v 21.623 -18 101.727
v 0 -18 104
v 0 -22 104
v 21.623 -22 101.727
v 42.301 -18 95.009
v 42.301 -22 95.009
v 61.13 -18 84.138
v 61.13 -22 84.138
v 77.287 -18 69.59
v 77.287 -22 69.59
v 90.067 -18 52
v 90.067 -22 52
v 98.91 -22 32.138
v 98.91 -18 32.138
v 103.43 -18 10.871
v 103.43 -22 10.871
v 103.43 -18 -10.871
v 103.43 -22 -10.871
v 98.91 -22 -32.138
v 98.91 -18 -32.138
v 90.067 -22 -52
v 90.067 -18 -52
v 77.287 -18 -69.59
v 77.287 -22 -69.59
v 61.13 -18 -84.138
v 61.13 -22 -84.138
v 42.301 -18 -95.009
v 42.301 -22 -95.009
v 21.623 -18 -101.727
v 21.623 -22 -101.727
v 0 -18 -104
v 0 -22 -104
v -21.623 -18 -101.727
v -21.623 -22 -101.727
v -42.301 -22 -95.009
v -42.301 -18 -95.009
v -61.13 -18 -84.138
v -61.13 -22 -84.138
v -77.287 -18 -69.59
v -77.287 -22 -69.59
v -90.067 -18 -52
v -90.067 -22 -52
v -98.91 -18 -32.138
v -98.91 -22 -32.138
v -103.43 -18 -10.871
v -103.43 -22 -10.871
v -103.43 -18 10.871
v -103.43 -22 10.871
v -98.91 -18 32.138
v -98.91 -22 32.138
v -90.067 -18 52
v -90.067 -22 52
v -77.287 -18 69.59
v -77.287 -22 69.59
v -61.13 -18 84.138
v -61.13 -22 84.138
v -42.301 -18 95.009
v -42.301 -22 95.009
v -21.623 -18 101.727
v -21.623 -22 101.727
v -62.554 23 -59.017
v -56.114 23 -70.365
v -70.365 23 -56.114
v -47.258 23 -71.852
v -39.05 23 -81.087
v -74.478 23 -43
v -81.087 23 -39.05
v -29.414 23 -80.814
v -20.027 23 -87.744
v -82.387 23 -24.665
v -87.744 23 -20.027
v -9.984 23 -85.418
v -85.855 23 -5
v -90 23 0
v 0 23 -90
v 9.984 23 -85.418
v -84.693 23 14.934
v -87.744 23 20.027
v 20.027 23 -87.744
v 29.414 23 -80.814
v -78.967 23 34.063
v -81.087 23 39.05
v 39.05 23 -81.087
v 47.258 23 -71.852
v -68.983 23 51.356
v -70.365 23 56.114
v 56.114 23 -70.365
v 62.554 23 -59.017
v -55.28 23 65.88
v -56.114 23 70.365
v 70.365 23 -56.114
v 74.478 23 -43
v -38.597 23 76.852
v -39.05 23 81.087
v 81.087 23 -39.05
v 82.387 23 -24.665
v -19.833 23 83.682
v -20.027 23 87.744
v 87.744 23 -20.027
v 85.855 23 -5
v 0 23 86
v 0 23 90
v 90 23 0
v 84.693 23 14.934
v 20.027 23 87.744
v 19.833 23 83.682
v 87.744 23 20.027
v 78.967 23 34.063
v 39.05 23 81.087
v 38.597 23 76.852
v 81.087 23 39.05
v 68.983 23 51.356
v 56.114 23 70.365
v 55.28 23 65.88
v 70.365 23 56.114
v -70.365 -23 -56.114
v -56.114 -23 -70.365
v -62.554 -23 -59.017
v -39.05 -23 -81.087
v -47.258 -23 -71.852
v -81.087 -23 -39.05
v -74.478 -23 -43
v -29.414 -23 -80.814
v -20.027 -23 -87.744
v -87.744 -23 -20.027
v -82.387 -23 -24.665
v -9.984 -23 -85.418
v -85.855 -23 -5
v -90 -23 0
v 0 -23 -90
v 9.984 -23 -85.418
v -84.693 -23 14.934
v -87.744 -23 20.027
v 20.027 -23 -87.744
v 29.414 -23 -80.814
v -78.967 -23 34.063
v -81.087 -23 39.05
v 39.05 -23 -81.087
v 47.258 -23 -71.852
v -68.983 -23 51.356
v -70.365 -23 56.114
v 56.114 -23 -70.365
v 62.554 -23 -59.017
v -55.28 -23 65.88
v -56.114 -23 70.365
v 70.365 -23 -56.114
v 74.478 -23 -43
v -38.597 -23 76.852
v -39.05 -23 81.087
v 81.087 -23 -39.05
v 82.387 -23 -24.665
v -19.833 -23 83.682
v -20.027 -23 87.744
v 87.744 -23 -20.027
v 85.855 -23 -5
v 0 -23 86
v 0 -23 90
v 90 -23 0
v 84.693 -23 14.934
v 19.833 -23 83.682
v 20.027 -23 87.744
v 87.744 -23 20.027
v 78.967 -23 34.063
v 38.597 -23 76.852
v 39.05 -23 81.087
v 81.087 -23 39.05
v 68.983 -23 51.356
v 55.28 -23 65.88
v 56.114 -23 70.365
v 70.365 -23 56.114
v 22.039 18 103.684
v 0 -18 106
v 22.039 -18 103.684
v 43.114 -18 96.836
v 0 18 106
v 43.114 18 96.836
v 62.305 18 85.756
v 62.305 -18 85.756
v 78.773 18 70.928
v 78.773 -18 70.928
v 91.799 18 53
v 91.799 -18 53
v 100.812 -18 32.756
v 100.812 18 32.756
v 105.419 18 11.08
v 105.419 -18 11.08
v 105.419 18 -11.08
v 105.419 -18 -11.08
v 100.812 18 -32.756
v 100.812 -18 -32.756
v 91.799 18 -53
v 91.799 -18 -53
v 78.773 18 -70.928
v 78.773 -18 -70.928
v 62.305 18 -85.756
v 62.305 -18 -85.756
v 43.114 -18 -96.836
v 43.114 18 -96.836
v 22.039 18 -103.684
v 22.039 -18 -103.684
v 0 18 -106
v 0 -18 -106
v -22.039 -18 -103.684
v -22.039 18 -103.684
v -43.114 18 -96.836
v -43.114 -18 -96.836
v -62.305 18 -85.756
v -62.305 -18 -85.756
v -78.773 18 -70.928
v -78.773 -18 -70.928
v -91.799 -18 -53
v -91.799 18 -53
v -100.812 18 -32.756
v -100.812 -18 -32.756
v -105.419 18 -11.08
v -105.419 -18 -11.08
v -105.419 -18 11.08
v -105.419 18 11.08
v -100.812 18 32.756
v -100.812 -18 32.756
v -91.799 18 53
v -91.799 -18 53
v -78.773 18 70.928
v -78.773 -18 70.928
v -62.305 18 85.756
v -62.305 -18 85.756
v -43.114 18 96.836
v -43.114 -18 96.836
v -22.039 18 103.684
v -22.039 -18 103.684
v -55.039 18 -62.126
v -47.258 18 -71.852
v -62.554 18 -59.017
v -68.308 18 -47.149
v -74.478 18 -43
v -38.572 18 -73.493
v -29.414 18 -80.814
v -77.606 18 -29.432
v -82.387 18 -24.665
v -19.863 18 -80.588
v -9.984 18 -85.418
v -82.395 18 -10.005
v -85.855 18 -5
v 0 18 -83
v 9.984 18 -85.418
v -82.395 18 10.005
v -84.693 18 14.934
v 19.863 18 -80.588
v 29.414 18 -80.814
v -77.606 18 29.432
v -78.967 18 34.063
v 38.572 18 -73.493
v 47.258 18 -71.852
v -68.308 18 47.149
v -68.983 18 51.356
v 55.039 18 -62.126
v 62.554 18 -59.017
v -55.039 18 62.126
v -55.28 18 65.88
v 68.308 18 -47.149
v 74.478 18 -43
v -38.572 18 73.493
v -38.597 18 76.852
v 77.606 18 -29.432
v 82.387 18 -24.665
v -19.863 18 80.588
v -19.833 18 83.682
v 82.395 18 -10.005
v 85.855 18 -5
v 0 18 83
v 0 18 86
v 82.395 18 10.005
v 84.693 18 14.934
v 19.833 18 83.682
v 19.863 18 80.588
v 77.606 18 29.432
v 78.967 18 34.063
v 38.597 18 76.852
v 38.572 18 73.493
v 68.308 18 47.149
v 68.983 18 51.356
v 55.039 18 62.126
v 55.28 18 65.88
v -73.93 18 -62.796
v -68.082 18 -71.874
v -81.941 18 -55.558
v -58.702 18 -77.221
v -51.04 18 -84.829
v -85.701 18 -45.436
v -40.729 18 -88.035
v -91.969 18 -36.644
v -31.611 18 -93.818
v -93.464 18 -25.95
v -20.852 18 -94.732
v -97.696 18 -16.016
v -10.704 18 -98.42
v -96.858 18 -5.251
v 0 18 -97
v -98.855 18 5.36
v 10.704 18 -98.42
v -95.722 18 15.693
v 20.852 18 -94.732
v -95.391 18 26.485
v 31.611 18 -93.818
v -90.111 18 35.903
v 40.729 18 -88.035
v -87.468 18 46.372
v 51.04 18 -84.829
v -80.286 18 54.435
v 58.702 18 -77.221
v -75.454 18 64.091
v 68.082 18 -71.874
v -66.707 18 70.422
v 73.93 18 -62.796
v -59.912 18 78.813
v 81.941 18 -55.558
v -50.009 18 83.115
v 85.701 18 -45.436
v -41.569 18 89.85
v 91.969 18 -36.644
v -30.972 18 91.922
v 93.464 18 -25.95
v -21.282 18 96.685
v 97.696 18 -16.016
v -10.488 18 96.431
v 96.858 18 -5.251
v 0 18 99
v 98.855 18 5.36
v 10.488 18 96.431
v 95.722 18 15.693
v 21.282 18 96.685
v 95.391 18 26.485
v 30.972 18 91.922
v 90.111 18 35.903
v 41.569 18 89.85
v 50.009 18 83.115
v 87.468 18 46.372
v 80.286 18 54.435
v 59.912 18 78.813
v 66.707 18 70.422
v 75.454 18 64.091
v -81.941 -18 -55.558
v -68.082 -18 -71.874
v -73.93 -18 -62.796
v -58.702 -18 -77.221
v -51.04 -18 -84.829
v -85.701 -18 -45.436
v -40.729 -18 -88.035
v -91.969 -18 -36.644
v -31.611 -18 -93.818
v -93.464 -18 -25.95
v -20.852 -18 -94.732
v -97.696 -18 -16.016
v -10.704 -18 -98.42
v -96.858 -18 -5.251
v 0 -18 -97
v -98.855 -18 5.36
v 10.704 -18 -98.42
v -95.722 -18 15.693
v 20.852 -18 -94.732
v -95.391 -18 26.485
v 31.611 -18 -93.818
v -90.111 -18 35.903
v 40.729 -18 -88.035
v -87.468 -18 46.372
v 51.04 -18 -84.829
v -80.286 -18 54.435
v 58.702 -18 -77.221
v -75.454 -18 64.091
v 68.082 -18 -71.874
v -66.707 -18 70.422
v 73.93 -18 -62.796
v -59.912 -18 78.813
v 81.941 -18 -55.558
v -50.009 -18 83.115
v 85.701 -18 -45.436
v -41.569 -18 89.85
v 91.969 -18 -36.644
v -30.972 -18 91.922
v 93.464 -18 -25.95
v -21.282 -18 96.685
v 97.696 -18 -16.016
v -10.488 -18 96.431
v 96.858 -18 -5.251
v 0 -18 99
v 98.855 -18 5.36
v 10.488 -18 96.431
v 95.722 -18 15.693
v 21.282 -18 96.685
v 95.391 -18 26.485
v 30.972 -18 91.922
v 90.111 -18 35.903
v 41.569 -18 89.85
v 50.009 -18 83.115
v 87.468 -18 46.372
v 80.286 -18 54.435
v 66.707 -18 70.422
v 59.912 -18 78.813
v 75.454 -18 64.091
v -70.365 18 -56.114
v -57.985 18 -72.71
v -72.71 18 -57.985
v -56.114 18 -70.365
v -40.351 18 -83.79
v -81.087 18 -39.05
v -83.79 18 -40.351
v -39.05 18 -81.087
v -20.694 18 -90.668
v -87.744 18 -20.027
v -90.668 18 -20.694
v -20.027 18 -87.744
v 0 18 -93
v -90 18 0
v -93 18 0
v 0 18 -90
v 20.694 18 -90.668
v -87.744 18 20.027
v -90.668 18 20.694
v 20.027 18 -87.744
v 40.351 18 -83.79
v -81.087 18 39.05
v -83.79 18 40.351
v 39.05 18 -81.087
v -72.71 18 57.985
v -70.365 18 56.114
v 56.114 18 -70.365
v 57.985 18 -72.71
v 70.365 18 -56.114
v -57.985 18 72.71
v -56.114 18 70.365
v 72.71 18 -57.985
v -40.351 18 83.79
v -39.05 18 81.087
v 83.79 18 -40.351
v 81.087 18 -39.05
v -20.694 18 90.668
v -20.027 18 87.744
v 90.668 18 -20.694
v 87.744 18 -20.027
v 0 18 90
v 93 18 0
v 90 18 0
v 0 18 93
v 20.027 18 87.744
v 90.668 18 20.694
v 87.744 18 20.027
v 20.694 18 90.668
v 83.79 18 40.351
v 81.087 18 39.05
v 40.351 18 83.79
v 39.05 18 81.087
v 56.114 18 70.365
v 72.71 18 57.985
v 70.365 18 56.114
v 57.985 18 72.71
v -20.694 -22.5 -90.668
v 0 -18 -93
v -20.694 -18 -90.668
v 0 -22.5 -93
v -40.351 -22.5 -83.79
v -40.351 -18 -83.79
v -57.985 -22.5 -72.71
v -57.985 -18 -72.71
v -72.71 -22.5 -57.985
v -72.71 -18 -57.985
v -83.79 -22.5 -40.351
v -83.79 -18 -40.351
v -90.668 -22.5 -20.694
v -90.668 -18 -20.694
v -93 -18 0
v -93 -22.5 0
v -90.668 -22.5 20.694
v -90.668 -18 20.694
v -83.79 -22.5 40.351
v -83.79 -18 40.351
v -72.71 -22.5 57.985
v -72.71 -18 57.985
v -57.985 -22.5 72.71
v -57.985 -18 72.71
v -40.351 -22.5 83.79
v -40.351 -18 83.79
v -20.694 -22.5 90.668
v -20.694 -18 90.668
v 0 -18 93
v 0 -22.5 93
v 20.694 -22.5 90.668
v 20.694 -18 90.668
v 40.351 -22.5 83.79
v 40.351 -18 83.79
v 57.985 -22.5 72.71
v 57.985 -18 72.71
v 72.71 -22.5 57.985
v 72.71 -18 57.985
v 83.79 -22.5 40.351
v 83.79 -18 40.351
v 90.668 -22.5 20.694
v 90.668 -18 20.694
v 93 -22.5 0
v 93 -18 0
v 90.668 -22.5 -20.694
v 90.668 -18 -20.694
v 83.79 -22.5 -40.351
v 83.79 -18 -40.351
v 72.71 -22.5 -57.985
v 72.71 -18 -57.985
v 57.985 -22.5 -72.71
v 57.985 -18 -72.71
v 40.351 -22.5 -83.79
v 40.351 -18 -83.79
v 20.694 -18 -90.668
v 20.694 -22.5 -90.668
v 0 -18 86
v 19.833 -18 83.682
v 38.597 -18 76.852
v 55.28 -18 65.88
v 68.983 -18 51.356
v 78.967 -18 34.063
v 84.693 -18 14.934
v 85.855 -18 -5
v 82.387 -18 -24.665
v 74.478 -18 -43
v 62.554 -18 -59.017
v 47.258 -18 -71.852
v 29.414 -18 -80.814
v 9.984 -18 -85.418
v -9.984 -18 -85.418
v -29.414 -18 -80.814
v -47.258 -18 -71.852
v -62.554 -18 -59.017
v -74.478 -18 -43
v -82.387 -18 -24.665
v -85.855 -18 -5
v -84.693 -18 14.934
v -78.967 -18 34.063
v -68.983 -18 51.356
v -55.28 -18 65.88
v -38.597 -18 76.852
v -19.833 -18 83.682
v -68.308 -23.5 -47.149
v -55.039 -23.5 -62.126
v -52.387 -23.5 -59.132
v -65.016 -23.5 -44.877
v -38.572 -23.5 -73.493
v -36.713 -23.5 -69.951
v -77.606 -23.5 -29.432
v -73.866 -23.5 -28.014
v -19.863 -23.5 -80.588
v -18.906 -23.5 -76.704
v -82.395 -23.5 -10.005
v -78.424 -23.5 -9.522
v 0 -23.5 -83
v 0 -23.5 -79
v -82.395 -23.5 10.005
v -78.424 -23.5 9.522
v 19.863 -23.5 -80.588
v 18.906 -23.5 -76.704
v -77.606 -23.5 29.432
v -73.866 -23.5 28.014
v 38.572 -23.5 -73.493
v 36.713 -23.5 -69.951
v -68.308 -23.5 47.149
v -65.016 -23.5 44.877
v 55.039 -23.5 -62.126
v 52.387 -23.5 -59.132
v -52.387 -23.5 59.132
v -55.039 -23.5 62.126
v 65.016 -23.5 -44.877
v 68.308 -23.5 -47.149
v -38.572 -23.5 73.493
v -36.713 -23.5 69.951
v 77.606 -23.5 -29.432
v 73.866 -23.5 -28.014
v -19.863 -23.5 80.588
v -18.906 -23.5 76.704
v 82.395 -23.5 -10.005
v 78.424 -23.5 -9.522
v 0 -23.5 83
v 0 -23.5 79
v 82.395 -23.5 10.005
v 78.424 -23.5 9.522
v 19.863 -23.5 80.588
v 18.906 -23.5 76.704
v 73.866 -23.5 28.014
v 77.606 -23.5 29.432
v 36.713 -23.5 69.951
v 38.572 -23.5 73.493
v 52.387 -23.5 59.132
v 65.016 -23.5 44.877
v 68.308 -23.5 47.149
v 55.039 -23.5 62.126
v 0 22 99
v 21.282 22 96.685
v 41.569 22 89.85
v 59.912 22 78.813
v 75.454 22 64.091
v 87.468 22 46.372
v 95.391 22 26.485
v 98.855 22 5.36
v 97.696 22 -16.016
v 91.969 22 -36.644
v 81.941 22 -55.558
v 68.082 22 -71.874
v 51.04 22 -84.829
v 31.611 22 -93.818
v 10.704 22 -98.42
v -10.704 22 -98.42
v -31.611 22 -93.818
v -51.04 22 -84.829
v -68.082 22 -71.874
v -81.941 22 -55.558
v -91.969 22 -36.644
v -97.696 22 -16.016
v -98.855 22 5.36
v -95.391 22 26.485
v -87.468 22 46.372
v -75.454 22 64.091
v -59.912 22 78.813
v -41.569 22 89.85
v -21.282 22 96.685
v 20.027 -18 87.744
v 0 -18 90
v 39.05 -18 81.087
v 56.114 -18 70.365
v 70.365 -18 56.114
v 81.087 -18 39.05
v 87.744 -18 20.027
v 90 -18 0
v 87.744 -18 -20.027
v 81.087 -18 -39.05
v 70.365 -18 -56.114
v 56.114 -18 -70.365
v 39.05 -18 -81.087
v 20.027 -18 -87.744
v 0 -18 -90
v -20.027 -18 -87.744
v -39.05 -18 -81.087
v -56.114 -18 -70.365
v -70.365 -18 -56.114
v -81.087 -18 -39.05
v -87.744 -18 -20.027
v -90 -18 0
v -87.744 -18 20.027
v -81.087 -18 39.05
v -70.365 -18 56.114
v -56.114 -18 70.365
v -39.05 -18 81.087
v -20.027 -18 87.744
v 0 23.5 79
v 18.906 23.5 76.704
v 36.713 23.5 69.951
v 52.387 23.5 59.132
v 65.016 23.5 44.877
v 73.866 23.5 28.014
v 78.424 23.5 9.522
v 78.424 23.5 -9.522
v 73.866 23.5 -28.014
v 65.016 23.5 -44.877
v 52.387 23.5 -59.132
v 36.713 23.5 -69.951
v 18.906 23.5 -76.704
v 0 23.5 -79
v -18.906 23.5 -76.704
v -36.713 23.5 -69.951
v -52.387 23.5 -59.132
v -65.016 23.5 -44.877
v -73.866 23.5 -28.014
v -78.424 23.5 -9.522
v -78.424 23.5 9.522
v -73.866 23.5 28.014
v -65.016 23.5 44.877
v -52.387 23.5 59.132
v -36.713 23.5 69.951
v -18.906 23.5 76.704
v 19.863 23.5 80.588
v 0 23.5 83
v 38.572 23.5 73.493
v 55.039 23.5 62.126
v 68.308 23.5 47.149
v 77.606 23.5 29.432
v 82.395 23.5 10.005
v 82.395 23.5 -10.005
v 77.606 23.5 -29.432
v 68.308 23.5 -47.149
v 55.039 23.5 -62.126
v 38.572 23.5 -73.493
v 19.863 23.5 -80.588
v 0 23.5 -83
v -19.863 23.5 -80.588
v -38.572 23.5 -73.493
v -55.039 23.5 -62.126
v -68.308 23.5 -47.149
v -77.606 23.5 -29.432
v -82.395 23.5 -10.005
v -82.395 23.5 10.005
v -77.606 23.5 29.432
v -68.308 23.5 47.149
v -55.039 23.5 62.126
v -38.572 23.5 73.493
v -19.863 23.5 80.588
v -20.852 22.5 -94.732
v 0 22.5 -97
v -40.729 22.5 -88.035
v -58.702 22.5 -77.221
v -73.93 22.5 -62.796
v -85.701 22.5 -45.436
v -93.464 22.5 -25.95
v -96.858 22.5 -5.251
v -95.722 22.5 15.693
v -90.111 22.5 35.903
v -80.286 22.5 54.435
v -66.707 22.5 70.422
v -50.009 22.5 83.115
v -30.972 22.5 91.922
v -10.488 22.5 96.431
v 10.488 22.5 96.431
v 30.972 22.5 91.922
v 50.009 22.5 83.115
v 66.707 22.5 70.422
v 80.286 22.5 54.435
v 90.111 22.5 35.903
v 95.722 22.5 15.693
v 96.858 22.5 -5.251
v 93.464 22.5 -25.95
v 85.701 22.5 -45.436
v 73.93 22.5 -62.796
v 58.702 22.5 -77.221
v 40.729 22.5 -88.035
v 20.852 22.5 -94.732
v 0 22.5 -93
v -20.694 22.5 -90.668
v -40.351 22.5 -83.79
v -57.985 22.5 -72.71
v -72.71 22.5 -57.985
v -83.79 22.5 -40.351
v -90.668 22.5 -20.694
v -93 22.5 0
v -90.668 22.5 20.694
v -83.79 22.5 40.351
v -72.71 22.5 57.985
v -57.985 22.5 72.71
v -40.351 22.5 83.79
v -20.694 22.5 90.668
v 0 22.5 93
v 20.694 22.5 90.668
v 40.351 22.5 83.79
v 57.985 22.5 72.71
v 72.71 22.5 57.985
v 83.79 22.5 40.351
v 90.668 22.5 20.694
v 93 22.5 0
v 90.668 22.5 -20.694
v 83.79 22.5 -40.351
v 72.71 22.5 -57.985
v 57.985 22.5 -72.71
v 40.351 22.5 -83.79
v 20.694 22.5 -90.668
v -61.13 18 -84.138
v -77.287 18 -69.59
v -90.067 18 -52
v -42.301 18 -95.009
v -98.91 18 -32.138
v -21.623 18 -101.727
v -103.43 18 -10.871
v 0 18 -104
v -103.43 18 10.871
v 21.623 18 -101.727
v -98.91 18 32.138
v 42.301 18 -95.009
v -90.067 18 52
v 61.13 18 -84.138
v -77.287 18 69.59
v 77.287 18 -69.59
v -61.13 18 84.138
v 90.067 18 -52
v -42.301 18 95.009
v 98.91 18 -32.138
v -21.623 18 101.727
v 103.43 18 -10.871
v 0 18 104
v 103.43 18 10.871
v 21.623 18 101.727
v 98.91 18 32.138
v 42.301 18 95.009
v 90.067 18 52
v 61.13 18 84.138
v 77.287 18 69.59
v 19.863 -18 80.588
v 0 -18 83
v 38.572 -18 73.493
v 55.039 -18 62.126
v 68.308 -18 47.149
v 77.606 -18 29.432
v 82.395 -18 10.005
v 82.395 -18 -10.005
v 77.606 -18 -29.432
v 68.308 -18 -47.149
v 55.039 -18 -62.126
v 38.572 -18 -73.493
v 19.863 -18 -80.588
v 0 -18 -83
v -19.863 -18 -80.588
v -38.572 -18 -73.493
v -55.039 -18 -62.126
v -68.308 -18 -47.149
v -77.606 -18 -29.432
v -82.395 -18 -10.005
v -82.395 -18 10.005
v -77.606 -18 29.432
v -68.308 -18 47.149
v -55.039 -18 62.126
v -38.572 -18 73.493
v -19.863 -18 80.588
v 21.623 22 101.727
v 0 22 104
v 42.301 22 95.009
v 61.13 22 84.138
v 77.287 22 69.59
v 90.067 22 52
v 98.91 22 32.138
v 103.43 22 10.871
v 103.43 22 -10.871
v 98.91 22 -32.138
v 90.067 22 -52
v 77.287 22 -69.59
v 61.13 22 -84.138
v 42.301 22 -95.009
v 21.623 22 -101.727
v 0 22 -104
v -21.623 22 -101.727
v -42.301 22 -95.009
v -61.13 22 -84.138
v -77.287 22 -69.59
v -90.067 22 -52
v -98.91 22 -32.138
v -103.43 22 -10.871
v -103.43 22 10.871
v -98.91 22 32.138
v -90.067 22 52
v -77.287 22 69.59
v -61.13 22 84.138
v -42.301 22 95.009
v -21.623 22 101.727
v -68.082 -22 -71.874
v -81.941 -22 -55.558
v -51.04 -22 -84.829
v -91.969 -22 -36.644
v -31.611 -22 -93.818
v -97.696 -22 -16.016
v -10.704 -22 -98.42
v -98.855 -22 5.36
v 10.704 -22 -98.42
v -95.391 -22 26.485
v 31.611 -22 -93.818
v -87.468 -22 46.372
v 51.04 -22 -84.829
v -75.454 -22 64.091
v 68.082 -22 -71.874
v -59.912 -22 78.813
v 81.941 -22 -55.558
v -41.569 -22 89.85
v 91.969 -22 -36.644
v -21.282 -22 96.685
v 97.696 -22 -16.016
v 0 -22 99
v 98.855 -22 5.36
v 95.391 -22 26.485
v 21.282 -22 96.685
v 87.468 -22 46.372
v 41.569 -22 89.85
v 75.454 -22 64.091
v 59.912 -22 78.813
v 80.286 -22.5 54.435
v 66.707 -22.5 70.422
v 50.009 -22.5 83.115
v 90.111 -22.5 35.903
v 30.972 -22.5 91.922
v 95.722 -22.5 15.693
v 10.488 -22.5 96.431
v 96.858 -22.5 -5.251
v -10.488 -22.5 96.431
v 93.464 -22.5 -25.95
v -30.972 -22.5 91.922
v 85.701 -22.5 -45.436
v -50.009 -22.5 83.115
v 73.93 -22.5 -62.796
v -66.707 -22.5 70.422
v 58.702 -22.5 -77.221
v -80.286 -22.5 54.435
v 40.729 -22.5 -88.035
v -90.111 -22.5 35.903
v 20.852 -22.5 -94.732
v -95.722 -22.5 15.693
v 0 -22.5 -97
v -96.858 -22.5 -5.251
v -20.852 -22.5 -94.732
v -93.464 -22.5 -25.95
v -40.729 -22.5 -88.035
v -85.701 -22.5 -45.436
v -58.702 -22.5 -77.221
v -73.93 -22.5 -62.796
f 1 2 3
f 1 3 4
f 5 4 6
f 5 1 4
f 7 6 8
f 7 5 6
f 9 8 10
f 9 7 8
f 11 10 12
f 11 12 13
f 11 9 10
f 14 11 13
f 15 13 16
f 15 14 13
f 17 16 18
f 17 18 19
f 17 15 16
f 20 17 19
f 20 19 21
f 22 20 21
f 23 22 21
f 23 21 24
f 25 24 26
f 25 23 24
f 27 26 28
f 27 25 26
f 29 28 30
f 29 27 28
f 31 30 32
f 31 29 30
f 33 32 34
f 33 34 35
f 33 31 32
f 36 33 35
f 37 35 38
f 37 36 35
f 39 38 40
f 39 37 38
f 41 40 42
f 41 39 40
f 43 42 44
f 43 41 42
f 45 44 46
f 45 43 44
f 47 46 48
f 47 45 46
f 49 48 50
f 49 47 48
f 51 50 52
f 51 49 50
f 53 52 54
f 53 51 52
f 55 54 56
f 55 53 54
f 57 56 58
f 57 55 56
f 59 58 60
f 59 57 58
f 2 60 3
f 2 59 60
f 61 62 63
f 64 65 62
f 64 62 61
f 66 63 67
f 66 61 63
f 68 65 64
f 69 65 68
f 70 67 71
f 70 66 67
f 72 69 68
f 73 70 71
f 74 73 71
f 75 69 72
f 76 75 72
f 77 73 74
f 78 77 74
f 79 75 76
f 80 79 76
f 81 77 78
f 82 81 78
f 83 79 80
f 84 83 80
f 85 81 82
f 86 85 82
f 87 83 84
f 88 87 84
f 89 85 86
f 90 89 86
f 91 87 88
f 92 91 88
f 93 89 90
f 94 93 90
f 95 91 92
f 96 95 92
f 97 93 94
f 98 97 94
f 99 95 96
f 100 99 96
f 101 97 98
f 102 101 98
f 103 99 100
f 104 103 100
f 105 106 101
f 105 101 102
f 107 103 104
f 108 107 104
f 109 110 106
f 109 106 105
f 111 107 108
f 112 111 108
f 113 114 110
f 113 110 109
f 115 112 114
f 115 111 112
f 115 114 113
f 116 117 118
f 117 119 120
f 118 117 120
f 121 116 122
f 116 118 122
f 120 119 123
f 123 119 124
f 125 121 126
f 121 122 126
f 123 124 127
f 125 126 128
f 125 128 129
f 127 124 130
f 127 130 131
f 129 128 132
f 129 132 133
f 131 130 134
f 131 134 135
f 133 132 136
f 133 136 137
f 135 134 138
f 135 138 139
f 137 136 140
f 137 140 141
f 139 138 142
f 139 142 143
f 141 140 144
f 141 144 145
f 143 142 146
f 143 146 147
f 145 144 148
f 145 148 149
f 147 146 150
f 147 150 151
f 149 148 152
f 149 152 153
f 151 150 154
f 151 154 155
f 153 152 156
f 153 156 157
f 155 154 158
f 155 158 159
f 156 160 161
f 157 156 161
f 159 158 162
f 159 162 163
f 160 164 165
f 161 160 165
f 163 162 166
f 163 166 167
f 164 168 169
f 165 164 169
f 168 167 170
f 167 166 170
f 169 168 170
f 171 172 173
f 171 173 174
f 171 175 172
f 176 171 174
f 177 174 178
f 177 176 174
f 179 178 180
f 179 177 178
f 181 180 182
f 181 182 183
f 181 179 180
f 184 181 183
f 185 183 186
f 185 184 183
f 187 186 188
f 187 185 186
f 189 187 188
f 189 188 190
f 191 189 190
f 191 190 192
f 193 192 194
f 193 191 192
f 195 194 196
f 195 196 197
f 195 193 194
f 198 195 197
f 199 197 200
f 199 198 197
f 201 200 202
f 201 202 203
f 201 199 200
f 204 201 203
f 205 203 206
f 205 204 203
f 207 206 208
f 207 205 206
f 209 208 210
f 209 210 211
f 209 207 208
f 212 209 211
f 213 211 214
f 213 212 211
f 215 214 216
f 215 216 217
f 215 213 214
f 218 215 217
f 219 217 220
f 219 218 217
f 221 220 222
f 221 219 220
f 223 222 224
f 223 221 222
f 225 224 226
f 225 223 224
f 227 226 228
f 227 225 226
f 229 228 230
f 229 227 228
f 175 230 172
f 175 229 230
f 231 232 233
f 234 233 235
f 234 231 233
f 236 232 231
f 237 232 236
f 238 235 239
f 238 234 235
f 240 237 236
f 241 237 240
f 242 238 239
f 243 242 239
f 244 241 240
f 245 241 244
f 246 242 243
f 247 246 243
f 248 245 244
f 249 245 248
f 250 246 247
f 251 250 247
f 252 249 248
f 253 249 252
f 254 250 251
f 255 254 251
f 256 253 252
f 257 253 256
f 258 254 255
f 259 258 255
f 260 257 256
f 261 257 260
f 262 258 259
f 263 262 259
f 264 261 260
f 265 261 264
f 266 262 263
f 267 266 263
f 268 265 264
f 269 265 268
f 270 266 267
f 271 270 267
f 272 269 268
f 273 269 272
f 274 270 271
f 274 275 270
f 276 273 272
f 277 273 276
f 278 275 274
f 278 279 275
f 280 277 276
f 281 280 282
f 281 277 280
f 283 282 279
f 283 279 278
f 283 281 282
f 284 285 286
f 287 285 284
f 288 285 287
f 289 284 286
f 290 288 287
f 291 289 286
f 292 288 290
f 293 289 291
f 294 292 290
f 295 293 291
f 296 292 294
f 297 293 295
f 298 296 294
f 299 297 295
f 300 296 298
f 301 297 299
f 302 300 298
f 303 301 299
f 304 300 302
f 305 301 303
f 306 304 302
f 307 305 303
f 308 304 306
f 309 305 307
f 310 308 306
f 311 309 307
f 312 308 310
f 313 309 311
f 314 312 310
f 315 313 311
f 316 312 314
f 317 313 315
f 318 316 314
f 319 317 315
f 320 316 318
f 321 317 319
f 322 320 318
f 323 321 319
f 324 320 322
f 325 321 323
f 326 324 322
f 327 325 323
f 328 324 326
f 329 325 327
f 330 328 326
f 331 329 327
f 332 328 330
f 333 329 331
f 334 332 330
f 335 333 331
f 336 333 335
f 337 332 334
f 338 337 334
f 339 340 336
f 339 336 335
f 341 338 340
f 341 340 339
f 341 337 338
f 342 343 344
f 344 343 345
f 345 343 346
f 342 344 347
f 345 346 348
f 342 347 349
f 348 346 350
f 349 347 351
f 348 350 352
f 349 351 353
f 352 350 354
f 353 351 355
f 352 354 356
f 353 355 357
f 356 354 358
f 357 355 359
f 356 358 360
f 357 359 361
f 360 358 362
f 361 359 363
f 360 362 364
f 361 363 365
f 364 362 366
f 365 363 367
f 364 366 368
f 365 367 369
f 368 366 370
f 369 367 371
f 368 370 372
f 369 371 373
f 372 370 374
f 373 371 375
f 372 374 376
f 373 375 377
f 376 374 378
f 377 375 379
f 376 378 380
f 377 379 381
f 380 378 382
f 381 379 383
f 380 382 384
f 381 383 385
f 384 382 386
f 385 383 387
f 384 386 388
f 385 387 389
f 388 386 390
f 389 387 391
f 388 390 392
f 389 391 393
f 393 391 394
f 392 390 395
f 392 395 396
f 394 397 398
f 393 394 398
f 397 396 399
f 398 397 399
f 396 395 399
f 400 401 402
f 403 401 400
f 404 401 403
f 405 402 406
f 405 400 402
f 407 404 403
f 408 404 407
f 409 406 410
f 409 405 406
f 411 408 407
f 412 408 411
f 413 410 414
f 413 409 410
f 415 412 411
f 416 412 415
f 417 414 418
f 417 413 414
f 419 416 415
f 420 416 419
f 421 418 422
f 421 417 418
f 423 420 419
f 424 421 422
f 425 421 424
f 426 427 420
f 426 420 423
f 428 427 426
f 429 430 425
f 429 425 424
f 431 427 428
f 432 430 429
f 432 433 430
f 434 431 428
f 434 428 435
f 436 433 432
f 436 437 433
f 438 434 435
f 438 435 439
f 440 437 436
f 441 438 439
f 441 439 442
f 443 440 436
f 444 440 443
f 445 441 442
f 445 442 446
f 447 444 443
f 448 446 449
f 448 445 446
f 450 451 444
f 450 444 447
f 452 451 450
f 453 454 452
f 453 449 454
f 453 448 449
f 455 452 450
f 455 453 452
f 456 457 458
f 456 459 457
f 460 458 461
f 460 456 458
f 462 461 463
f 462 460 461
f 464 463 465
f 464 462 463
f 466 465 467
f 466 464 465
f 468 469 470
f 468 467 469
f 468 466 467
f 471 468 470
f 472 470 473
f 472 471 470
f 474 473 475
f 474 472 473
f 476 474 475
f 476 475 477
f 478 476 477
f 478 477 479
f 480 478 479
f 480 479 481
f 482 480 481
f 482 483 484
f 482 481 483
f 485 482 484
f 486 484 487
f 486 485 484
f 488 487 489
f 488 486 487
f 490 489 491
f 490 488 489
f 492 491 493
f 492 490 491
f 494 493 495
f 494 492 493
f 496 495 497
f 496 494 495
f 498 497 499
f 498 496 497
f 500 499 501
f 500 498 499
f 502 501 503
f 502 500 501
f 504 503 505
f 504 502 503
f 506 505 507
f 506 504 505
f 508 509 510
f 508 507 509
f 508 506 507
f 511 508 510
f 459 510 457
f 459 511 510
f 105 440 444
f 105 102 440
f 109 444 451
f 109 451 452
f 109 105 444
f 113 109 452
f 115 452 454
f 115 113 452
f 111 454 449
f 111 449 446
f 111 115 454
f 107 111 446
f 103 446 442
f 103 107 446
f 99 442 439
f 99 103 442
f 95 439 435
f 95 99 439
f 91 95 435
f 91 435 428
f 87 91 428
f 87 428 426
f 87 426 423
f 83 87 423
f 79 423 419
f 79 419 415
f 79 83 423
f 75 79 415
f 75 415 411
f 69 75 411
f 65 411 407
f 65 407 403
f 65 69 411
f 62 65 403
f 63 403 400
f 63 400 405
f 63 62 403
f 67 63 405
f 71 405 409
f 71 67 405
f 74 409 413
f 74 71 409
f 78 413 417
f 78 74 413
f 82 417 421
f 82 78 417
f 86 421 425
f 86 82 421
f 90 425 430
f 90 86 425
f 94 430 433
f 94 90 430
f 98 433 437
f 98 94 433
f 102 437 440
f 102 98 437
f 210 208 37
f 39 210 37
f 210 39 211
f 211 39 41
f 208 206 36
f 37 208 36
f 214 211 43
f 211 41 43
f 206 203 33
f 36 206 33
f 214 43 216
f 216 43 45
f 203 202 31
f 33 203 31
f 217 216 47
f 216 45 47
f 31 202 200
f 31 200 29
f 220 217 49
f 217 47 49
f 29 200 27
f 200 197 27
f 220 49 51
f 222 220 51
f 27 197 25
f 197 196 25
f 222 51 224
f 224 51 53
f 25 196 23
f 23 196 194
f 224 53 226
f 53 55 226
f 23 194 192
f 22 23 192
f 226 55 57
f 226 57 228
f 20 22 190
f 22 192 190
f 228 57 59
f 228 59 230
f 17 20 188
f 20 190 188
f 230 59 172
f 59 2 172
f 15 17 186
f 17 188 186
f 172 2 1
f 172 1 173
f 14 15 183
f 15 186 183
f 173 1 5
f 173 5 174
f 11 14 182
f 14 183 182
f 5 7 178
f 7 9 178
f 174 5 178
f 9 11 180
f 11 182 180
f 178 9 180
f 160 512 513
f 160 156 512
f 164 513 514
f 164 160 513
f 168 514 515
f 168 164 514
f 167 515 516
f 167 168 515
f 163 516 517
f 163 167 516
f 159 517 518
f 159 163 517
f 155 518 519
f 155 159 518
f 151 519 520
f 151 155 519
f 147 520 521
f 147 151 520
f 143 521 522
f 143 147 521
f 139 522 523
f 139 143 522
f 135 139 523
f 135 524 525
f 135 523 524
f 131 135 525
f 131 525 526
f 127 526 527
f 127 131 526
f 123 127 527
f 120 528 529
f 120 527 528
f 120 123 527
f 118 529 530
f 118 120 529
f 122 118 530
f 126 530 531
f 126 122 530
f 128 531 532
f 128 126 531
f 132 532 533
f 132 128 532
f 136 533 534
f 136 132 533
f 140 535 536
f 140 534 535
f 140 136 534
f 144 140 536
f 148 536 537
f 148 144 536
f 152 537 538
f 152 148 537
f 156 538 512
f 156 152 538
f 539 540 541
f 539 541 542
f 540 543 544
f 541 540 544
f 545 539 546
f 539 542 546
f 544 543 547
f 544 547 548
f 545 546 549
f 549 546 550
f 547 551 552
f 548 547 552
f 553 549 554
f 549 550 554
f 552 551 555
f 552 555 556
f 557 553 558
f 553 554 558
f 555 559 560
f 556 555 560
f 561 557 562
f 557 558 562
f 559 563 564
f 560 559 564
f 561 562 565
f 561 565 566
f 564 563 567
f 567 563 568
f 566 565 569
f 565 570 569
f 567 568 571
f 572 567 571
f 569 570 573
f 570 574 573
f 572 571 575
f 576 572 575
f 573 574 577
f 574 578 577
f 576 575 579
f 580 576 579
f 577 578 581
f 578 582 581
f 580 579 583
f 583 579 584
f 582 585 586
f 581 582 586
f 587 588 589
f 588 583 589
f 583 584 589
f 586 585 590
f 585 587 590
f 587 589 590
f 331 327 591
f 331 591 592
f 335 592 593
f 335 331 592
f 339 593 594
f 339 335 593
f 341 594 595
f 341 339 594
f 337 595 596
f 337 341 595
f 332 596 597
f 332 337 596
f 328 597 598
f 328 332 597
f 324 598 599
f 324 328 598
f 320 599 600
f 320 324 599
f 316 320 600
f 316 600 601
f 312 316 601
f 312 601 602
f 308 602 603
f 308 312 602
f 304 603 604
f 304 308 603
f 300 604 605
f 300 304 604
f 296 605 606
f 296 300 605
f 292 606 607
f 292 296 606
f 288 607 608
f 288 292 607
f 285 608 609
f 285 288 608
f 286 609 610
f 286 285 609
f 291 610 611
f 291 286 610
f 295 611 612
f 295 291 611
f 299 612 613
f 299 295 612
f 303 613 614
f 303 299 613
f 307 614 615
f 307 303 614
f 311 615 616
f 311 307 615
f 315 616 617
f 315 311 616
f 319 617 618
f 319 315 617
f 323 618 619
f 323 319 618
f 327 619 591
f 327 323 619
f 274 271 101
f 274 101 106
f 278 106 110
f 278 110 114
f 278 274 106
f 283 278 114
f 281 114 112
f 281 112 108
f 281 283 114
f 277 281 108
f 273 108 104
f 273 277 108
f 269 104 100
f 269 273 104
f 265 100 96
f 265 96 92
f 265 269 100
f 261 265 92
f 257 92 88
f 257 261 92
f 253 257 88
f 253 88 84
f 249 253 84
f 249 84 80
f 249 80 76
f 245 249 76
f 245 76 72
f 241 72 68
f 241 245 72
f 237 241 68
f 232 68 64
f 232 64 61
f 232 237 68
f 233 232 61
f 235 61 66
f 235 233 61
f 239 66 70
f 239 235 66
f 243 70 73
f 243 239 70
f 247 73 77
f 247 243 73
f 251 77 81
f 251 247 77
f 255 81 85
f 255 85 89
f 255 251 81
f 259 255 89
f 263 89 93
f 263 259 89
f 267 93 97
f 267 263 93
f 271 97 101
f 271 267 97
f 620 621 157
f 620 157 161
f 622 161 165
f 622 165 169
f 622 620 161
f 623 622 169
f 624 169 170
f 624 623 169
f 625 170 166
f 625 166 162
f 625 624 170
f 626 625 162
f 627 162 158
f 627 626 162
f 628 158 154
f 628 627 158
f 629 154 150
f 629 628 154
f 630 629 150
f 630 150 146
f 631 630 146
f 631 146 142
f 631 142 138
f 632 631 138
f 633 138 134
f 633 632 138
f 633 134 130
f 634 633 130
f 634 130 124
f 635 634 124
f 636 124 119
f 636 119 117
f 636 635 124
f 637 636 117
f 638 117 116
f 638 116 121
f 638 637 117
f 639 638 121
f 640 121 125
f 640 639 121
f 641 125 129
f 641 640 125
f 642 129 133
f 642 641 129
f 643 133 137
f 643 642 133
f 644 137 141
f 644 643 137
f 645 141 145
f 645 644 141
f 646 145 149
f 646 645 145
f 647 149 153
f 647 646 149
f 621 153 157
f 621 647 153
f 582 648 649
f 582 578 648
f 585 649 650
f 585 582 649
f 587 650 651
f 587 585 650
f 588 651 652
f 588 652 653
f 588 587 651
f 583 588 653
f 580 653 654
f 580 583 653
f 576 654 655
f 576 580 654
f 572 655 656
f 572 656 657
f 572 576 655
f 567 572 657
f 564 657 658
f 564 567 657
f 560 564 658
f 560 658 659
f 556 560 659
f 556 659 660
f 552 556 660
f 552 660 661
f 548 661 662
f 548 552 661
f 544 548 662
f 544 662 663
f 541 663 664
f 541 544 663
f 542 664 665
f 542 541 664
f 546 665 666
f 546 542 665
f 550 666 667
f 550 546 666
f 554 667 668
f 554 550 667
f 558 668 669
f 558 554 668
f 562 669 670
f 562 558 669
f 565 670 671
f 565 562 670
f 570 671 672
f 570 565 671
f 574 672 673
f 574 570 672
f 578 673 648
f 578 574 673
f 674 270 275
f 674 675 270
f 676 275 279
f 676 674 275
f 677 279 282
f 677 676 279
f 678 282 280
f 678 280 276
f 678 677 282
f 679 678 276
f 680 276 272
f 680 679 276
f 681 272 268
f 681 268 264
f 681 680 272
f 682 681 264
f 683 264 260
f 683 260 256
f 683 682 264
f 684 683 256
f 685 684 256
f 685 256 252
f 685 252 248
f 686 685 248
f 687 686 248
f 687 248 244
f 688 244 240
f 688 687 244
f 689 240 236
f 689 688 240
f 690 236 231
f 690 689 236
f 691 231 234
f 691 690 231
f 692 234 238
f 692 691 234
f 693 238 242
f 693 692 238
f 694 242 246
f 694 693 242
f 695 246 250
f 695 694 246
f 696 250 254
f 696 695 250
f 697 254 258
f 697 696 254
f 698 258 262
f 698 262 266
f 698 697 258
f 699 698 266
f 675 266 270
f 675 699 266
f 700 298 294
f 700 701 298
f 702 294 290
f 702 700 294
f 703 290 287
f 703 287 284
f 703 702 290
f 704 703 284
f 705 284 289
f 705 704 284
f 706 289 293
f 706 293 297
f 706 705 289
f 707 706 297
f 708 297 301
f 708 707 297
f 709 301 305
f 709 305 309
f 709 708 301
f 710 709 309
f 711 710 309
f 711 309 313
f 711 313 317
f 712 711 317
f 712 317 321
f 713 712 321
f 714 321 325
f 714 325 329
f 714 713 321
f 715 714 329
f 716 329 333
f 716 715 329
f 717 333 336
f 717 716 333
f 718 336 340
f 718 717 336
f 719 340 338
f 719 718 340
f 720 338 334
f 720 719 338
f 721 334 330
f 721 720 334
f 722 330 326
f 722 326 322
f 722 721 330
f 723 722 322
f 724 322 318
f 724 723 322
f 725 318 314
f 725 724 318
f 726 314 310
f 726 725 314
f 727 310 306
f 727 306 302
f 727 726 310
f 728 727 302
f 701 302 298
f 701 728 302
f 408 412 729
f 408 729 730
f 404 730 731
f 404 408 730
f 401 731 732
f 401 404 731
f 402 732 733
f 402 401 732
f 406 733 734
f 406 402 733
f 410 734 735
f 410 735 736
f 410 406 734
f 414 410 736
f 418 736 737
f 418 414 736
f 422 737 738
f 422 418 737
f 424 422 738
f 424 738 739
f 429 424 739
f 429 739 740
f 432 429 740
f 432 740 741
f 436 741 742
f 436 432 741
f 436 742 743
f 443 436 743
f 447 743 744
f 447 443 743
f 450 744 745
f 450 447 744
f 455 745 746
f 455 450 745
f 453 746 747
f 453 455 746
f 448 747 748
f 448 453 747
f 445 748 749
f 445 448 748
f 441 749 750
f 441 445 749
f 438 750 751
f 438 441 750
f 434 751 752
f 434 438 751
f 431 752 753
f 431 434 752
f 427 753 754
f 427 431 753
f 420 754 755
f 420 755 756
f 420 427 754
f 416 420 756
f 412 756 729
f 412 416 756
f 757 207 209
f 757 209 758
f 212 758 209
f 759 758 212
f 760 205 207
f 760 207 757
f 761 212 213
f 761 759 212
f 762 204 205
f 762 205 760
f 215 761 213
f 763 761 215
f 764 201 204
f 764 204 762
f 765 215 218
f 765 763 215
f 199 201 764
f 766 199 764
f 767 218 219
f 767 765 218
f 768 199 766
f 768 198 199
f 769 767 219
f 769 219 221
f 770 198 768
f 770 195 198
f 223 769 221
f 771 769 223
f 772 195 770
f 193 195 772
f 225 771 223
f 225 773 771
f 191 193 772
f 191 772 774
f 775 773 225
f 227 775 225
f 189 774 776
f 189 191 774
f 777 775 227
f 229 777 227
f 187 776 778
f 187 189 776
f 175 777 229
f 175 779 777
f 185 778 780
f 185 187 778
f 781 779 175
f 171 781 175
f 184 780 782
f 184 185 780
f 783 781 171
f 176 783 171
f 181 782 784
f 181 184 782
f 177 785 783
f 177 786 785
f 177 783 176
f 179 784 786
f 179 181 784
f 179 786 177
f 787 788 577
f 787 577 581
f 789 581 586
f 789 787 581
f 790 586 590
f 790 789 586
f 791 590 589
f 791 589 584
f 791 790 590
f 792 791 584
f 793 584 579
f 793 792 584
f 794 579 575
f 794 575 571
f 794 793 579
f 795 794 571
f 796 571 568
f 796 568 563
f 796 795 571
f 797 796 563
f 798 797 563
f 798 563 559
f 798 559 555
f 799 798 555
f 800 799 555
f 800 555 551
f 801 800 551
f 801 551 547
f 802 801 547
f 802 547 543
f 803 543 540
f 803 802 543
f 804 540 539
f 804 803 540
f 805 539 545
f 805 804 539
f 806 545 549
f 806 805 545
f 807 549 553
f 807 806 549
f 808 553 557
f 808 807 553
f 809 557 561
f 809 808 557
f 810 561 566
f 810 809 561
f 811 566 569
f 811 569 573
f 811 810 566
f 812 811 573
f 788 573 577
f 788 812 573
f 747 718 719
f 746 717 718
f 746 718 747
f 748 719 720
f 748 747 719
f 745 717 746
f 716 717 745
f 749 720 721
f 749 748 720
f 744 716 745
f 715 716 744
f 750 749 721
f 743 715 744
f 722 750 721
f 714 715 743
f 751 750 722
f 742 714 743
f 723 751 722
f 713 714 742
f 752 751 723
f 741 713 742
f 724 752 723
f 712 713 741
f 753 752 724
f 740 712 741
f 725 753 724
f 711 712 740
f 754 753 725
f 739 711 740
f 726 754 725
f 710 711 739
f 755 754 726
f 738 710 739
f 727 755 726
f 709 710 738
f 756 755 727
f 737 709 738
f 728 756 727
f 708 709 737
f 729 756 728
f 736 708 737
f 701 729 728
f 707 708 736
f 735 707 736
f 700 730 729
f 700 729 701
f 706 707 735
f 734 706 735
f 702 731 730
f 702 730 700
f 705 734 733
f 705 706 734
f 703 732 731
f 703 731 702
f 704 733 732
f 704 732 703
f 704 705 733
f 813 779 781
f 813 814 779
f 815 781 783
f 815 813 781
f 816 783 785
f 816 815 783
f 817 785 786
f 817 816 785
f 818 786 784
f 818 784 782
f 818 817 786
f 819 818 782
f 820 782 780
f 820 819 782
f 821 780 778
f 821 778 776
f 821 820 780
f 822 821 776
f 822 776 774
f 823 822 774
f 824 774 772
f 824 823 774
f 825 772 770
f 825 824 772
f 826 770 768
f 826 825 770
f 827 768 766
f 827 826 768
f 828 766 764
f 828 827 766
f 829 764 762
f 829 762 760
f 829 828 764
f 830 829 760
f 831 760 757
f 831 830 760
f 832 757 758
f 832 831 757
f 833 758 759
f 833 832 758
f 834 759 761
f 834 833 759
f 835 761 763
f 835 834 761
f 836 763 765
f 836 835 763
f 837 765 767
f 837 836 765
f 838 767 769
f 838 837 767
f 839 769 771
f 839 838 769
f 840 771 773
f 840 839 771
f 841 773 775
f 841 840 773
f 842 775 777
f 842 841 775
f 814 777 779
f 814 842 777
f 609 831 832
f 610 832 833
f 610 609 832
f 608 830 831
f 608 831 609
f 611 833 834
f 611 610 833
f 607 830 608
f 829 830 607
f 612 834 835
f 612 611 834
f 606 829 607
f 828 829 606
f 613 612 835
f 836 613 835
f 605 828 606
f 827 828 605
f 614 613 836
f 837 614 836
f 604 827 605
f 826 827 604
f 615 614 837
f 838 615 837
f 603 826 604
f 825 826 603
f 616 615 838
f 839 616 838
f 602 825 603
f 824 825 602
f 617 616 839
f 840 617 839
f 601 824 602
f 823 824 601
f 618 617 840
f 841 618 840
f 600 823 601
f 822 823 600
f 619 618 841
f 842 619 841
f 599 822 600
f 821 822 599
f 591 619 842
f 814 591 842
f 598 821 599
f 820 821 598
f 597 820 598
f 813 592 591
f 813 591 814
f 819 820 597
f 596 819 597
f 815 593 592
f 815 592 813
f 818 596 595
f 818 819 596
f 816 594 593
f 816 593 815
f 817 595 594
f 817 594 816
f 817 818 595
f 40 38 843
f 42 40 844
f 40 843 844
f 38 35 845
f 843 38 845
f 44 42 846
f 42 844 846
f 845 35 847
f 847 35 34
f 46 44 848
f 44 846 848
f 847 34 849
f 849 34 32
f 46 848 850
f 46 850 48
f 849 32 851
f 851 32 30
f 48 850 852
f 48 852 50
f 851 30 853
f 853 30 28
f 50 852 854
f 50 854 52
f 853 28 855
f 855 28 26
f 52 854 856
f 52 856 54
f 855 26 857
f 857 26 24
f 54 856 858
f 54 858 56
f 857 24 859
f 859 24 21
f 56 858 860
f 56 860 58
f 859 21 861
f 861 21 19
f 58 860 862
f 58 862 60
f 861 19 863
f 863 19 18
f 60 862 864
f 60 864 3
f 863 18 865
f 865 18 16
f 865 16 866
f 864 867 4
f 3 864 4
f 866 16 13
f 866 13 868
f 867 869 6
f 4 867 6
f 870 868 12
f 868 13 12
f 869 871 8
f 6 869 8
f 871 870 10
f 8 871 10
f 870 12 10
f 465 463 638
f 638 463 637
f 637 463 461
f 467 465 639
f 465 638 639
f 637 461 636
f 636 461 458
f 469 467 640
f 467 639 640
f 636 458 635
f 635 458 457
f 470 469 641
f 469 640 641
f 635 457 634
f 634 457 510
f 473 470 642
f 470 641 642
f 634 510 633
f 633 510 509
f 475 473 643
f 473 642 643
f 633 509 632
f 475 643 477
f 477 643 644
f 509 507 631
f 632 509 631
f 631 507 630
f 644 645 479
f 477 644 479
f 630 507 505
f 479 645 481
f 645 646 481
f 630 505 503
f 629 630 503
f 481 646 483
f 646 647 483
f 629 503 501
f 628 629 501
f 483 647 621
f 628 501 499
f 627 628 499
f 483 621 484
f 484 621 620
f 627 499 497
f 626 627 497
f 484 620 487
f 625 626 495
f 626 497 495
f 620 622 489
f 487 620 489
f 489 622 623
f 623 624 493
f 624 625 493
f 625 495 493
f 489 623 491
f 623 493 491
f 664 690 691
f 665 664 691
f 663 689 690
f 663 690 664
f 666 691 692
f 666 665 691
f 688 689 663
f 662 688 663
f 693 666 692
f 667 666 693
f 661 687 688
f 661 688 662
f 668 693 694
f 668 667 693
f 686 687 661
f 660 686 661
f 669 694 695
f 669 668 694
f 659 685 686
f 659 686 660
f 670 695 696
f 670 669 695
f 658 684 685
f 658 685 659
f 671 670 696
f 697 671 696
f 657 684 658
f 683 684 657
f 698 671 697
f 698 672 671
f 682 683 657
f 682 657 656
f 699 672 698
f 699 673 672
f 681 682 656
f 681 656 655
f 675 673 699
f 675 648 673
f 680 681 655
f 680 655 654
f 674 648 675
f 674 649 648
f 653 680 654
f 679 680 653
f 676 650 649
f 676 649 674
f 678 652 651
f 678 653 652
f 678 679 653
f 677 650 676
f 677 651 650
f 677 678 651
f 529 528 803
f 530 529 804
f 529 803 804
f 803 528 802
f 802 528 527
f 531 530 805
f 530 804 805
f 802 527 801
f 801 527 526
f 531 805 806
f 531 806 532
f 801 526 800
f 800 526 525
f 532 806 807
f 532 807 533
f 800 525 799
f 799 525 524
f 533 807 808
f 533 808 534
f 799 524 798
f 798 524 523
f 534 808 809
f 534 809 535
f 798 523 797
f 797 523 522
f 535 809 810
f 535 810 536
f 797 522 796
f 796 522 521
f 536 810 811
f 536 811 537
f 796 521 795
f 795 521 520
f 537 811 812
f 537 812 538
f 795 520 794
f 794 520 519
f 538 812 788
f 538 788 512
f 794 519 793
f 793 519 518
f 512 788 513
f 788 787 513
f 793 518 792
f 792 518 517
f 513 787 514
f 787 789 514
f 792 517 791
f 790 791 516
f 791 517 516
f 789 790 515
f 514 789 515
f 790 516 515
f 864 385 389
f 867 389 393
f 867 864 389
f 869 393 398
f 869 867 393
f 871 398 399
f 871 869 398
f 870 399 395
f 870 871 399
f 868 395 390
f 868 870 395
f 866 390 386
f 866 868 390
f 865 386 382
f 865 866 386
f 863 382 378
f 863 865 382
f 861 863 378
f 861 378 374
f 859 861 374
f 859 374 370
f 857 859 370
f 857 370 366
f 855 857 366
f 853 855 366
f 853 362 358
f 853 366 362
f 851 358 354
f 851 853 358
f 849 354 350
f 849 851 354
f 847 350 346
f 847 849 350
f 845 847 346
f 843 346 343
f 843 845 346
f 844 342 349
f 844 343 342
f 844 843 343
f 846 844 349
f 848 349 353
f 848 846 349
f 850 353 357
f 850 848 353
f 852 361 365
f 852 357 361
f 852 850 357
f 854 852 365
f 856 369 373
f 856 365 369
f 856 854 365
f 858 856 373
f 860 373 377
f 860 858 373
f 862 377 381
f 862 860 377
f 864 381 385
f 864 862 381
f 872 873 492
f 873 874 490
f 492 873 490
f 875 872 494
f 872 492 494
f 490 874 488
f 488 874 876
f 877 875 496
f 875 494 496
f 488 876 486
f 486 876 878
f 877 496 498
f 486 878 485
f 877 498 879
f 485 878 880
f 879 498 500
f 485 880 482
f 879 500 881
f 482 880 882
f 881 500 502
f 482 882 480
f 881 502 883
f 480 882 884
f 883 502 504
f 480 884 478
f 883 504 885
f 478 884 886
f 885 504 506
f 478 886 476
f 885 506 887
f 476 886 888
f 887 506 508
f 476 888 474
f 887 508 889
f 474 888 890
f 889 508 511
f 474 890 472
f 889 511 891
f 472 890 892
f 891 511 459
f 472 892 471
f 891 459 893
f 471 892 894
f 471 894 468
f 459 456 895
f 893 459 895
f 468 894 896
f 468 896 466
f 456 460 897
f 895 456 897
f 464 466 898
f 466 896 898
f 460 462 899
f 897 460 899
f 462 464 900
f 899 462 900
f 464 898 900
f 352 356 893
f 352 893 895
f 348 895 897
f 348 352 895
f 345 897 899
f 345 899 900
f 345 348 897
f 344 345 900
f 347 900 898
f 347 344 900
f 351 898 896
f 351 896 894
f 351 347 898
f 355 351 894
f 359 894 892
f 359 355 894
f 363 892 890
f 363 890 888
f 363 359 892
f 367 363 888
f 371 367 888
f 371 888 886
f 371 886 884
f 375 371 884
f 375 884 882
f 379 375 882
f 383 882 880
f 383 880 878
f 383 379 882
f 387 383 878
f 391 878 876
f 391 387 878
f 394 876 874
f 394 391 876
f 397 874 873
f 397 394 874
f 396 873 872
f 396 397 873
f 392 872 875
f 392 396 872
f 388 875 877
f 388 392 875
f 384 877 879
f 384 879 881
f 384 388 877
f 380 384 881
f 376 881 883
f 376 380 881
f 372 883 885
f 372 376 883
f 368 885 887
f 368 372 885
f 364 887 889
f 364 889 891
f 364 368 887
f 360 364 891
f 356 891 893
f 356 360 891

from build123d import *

# Parameters (mm, degrees)
SKETCH1_R                              = 106
SKETCH1_R_2                            = 80
PRESENTATION_TIRE_CASING_ANNULUS_DEPTH = 18
SKETCH2_R                              = 104
SKETCH2_R_2                            = 99
OUTER_TIRE_SHOULDER_LINE_DEPTH         = 22
SKETCH3_R                              = 97
SKETCH3_R_2                            = 93
OUTER_TREAD_GROOVE_LINE_DEPTH          = 22.5
SKETCH4_R                              = 90
SKETCH4_R_2                            = 86
INNER_TREAD_GROOVE_LINE_DEPTH          = 23
SKETCH5_R                              = 83
SKETCH5_R_2                            = 79
INNER_TIRE_BEAD_LINE_DEPTH             = 23.5


with BuildPart() as part:
    # Sketch1 → Presentation tire casing annulus (new, symmetric)
    with BuildSketch(Plane(origin=(0, 0, 0), x_dir=(1, 0, 0), z_dir=(0, 1, 0))):
        with Locations(Location((0, 0, 0), (0, 0, 270))):
            Circle(SKETCH1_R)
        with Locations(Location((0, 0, 0), (0, 0, 270))):
            Circle(SKETCH1_R_2, mode=Mode.SUBTRACT)
    extrude(amount=PRESENTATION_TIRE_CASING_ANNULUS_DEPTH, both=True)

    # Sketch2 → outer tire shoulder line (add, symmetric)
    with BuildSketch(Plane(origin=(0, 0, 0), x_dir=(1, 0, 0), z_dir=(0, 1, 0))):
        with Locations(Location((0, 0, 0), (0, 0, 270))):
            Circle(SKETCH2_R)
        with Locations(Location((0, 0, 0), (0, 0, 270))):
            Circle(SKETCH2_R_2, mode=Mode.SUBTRACT)
    extrude(amount=OUTER_TIRE_SHOULDER_LINE_DEPTH, both=True)

    # Sketch3 → outer tread groove line (add, symmetric)
    with BuildSketch(Plane(origin=(0, 0, 0), x_dir=(1, 0, 0), z_dir=(0, 1, 0))):
        with Locations(Location((0, 0, 0), (0, 0, 90))):
            Circle(SKETCH3_R)
        with Locations(Location((0, 0, 0), (0, 0, 90))):
            Circle(SKETCH3_R_2, mode=Mode.SUBTRACT)
    extrude(amount=OUTER_TREAD_GROOVE_LINE_DEPTH, both=True)

    # Sketch4 → inner tread groove line (add, symmetric)
    with BuildSketch(Plane(origin=(0, 0, 0), x_dir=(1, 0, 0), z_dir=(0, 1, 0))):
        with Locations(Location((0, 0, 0), (0, 0, 270))):
            Circle(SKETCH4_R)
        with Locations(Location((0, 0, 0), (0, 0, 270))):
            Circle(SKETCH4_R_2, mode=Mode.SUBTRACT)
    extrude(amount=INNER_TREAD_GROOVE_LINE_DEPTH, both=True)

    # Sketch5 → inner tire bead line (add, symmetric)
    with BuildSketch(Plane(origin=(0, 0, 0), x_dir=(1, 0, 0), z_dir=(0, 1, 0))):
        with Locations(Location((0, 0, 0), (0, 0, 270))):
            Circle(SKETCH5_R)
        with Locations(Location((0, 0, 0), (0, 0, 270))):
            Circle(SKETCH5_R_2, mode=Mode.SUBTRACT)
    extrude(amount=INNER_TIRE_BEAD_LINE_DEPTH, both=True)


solid = part.part
